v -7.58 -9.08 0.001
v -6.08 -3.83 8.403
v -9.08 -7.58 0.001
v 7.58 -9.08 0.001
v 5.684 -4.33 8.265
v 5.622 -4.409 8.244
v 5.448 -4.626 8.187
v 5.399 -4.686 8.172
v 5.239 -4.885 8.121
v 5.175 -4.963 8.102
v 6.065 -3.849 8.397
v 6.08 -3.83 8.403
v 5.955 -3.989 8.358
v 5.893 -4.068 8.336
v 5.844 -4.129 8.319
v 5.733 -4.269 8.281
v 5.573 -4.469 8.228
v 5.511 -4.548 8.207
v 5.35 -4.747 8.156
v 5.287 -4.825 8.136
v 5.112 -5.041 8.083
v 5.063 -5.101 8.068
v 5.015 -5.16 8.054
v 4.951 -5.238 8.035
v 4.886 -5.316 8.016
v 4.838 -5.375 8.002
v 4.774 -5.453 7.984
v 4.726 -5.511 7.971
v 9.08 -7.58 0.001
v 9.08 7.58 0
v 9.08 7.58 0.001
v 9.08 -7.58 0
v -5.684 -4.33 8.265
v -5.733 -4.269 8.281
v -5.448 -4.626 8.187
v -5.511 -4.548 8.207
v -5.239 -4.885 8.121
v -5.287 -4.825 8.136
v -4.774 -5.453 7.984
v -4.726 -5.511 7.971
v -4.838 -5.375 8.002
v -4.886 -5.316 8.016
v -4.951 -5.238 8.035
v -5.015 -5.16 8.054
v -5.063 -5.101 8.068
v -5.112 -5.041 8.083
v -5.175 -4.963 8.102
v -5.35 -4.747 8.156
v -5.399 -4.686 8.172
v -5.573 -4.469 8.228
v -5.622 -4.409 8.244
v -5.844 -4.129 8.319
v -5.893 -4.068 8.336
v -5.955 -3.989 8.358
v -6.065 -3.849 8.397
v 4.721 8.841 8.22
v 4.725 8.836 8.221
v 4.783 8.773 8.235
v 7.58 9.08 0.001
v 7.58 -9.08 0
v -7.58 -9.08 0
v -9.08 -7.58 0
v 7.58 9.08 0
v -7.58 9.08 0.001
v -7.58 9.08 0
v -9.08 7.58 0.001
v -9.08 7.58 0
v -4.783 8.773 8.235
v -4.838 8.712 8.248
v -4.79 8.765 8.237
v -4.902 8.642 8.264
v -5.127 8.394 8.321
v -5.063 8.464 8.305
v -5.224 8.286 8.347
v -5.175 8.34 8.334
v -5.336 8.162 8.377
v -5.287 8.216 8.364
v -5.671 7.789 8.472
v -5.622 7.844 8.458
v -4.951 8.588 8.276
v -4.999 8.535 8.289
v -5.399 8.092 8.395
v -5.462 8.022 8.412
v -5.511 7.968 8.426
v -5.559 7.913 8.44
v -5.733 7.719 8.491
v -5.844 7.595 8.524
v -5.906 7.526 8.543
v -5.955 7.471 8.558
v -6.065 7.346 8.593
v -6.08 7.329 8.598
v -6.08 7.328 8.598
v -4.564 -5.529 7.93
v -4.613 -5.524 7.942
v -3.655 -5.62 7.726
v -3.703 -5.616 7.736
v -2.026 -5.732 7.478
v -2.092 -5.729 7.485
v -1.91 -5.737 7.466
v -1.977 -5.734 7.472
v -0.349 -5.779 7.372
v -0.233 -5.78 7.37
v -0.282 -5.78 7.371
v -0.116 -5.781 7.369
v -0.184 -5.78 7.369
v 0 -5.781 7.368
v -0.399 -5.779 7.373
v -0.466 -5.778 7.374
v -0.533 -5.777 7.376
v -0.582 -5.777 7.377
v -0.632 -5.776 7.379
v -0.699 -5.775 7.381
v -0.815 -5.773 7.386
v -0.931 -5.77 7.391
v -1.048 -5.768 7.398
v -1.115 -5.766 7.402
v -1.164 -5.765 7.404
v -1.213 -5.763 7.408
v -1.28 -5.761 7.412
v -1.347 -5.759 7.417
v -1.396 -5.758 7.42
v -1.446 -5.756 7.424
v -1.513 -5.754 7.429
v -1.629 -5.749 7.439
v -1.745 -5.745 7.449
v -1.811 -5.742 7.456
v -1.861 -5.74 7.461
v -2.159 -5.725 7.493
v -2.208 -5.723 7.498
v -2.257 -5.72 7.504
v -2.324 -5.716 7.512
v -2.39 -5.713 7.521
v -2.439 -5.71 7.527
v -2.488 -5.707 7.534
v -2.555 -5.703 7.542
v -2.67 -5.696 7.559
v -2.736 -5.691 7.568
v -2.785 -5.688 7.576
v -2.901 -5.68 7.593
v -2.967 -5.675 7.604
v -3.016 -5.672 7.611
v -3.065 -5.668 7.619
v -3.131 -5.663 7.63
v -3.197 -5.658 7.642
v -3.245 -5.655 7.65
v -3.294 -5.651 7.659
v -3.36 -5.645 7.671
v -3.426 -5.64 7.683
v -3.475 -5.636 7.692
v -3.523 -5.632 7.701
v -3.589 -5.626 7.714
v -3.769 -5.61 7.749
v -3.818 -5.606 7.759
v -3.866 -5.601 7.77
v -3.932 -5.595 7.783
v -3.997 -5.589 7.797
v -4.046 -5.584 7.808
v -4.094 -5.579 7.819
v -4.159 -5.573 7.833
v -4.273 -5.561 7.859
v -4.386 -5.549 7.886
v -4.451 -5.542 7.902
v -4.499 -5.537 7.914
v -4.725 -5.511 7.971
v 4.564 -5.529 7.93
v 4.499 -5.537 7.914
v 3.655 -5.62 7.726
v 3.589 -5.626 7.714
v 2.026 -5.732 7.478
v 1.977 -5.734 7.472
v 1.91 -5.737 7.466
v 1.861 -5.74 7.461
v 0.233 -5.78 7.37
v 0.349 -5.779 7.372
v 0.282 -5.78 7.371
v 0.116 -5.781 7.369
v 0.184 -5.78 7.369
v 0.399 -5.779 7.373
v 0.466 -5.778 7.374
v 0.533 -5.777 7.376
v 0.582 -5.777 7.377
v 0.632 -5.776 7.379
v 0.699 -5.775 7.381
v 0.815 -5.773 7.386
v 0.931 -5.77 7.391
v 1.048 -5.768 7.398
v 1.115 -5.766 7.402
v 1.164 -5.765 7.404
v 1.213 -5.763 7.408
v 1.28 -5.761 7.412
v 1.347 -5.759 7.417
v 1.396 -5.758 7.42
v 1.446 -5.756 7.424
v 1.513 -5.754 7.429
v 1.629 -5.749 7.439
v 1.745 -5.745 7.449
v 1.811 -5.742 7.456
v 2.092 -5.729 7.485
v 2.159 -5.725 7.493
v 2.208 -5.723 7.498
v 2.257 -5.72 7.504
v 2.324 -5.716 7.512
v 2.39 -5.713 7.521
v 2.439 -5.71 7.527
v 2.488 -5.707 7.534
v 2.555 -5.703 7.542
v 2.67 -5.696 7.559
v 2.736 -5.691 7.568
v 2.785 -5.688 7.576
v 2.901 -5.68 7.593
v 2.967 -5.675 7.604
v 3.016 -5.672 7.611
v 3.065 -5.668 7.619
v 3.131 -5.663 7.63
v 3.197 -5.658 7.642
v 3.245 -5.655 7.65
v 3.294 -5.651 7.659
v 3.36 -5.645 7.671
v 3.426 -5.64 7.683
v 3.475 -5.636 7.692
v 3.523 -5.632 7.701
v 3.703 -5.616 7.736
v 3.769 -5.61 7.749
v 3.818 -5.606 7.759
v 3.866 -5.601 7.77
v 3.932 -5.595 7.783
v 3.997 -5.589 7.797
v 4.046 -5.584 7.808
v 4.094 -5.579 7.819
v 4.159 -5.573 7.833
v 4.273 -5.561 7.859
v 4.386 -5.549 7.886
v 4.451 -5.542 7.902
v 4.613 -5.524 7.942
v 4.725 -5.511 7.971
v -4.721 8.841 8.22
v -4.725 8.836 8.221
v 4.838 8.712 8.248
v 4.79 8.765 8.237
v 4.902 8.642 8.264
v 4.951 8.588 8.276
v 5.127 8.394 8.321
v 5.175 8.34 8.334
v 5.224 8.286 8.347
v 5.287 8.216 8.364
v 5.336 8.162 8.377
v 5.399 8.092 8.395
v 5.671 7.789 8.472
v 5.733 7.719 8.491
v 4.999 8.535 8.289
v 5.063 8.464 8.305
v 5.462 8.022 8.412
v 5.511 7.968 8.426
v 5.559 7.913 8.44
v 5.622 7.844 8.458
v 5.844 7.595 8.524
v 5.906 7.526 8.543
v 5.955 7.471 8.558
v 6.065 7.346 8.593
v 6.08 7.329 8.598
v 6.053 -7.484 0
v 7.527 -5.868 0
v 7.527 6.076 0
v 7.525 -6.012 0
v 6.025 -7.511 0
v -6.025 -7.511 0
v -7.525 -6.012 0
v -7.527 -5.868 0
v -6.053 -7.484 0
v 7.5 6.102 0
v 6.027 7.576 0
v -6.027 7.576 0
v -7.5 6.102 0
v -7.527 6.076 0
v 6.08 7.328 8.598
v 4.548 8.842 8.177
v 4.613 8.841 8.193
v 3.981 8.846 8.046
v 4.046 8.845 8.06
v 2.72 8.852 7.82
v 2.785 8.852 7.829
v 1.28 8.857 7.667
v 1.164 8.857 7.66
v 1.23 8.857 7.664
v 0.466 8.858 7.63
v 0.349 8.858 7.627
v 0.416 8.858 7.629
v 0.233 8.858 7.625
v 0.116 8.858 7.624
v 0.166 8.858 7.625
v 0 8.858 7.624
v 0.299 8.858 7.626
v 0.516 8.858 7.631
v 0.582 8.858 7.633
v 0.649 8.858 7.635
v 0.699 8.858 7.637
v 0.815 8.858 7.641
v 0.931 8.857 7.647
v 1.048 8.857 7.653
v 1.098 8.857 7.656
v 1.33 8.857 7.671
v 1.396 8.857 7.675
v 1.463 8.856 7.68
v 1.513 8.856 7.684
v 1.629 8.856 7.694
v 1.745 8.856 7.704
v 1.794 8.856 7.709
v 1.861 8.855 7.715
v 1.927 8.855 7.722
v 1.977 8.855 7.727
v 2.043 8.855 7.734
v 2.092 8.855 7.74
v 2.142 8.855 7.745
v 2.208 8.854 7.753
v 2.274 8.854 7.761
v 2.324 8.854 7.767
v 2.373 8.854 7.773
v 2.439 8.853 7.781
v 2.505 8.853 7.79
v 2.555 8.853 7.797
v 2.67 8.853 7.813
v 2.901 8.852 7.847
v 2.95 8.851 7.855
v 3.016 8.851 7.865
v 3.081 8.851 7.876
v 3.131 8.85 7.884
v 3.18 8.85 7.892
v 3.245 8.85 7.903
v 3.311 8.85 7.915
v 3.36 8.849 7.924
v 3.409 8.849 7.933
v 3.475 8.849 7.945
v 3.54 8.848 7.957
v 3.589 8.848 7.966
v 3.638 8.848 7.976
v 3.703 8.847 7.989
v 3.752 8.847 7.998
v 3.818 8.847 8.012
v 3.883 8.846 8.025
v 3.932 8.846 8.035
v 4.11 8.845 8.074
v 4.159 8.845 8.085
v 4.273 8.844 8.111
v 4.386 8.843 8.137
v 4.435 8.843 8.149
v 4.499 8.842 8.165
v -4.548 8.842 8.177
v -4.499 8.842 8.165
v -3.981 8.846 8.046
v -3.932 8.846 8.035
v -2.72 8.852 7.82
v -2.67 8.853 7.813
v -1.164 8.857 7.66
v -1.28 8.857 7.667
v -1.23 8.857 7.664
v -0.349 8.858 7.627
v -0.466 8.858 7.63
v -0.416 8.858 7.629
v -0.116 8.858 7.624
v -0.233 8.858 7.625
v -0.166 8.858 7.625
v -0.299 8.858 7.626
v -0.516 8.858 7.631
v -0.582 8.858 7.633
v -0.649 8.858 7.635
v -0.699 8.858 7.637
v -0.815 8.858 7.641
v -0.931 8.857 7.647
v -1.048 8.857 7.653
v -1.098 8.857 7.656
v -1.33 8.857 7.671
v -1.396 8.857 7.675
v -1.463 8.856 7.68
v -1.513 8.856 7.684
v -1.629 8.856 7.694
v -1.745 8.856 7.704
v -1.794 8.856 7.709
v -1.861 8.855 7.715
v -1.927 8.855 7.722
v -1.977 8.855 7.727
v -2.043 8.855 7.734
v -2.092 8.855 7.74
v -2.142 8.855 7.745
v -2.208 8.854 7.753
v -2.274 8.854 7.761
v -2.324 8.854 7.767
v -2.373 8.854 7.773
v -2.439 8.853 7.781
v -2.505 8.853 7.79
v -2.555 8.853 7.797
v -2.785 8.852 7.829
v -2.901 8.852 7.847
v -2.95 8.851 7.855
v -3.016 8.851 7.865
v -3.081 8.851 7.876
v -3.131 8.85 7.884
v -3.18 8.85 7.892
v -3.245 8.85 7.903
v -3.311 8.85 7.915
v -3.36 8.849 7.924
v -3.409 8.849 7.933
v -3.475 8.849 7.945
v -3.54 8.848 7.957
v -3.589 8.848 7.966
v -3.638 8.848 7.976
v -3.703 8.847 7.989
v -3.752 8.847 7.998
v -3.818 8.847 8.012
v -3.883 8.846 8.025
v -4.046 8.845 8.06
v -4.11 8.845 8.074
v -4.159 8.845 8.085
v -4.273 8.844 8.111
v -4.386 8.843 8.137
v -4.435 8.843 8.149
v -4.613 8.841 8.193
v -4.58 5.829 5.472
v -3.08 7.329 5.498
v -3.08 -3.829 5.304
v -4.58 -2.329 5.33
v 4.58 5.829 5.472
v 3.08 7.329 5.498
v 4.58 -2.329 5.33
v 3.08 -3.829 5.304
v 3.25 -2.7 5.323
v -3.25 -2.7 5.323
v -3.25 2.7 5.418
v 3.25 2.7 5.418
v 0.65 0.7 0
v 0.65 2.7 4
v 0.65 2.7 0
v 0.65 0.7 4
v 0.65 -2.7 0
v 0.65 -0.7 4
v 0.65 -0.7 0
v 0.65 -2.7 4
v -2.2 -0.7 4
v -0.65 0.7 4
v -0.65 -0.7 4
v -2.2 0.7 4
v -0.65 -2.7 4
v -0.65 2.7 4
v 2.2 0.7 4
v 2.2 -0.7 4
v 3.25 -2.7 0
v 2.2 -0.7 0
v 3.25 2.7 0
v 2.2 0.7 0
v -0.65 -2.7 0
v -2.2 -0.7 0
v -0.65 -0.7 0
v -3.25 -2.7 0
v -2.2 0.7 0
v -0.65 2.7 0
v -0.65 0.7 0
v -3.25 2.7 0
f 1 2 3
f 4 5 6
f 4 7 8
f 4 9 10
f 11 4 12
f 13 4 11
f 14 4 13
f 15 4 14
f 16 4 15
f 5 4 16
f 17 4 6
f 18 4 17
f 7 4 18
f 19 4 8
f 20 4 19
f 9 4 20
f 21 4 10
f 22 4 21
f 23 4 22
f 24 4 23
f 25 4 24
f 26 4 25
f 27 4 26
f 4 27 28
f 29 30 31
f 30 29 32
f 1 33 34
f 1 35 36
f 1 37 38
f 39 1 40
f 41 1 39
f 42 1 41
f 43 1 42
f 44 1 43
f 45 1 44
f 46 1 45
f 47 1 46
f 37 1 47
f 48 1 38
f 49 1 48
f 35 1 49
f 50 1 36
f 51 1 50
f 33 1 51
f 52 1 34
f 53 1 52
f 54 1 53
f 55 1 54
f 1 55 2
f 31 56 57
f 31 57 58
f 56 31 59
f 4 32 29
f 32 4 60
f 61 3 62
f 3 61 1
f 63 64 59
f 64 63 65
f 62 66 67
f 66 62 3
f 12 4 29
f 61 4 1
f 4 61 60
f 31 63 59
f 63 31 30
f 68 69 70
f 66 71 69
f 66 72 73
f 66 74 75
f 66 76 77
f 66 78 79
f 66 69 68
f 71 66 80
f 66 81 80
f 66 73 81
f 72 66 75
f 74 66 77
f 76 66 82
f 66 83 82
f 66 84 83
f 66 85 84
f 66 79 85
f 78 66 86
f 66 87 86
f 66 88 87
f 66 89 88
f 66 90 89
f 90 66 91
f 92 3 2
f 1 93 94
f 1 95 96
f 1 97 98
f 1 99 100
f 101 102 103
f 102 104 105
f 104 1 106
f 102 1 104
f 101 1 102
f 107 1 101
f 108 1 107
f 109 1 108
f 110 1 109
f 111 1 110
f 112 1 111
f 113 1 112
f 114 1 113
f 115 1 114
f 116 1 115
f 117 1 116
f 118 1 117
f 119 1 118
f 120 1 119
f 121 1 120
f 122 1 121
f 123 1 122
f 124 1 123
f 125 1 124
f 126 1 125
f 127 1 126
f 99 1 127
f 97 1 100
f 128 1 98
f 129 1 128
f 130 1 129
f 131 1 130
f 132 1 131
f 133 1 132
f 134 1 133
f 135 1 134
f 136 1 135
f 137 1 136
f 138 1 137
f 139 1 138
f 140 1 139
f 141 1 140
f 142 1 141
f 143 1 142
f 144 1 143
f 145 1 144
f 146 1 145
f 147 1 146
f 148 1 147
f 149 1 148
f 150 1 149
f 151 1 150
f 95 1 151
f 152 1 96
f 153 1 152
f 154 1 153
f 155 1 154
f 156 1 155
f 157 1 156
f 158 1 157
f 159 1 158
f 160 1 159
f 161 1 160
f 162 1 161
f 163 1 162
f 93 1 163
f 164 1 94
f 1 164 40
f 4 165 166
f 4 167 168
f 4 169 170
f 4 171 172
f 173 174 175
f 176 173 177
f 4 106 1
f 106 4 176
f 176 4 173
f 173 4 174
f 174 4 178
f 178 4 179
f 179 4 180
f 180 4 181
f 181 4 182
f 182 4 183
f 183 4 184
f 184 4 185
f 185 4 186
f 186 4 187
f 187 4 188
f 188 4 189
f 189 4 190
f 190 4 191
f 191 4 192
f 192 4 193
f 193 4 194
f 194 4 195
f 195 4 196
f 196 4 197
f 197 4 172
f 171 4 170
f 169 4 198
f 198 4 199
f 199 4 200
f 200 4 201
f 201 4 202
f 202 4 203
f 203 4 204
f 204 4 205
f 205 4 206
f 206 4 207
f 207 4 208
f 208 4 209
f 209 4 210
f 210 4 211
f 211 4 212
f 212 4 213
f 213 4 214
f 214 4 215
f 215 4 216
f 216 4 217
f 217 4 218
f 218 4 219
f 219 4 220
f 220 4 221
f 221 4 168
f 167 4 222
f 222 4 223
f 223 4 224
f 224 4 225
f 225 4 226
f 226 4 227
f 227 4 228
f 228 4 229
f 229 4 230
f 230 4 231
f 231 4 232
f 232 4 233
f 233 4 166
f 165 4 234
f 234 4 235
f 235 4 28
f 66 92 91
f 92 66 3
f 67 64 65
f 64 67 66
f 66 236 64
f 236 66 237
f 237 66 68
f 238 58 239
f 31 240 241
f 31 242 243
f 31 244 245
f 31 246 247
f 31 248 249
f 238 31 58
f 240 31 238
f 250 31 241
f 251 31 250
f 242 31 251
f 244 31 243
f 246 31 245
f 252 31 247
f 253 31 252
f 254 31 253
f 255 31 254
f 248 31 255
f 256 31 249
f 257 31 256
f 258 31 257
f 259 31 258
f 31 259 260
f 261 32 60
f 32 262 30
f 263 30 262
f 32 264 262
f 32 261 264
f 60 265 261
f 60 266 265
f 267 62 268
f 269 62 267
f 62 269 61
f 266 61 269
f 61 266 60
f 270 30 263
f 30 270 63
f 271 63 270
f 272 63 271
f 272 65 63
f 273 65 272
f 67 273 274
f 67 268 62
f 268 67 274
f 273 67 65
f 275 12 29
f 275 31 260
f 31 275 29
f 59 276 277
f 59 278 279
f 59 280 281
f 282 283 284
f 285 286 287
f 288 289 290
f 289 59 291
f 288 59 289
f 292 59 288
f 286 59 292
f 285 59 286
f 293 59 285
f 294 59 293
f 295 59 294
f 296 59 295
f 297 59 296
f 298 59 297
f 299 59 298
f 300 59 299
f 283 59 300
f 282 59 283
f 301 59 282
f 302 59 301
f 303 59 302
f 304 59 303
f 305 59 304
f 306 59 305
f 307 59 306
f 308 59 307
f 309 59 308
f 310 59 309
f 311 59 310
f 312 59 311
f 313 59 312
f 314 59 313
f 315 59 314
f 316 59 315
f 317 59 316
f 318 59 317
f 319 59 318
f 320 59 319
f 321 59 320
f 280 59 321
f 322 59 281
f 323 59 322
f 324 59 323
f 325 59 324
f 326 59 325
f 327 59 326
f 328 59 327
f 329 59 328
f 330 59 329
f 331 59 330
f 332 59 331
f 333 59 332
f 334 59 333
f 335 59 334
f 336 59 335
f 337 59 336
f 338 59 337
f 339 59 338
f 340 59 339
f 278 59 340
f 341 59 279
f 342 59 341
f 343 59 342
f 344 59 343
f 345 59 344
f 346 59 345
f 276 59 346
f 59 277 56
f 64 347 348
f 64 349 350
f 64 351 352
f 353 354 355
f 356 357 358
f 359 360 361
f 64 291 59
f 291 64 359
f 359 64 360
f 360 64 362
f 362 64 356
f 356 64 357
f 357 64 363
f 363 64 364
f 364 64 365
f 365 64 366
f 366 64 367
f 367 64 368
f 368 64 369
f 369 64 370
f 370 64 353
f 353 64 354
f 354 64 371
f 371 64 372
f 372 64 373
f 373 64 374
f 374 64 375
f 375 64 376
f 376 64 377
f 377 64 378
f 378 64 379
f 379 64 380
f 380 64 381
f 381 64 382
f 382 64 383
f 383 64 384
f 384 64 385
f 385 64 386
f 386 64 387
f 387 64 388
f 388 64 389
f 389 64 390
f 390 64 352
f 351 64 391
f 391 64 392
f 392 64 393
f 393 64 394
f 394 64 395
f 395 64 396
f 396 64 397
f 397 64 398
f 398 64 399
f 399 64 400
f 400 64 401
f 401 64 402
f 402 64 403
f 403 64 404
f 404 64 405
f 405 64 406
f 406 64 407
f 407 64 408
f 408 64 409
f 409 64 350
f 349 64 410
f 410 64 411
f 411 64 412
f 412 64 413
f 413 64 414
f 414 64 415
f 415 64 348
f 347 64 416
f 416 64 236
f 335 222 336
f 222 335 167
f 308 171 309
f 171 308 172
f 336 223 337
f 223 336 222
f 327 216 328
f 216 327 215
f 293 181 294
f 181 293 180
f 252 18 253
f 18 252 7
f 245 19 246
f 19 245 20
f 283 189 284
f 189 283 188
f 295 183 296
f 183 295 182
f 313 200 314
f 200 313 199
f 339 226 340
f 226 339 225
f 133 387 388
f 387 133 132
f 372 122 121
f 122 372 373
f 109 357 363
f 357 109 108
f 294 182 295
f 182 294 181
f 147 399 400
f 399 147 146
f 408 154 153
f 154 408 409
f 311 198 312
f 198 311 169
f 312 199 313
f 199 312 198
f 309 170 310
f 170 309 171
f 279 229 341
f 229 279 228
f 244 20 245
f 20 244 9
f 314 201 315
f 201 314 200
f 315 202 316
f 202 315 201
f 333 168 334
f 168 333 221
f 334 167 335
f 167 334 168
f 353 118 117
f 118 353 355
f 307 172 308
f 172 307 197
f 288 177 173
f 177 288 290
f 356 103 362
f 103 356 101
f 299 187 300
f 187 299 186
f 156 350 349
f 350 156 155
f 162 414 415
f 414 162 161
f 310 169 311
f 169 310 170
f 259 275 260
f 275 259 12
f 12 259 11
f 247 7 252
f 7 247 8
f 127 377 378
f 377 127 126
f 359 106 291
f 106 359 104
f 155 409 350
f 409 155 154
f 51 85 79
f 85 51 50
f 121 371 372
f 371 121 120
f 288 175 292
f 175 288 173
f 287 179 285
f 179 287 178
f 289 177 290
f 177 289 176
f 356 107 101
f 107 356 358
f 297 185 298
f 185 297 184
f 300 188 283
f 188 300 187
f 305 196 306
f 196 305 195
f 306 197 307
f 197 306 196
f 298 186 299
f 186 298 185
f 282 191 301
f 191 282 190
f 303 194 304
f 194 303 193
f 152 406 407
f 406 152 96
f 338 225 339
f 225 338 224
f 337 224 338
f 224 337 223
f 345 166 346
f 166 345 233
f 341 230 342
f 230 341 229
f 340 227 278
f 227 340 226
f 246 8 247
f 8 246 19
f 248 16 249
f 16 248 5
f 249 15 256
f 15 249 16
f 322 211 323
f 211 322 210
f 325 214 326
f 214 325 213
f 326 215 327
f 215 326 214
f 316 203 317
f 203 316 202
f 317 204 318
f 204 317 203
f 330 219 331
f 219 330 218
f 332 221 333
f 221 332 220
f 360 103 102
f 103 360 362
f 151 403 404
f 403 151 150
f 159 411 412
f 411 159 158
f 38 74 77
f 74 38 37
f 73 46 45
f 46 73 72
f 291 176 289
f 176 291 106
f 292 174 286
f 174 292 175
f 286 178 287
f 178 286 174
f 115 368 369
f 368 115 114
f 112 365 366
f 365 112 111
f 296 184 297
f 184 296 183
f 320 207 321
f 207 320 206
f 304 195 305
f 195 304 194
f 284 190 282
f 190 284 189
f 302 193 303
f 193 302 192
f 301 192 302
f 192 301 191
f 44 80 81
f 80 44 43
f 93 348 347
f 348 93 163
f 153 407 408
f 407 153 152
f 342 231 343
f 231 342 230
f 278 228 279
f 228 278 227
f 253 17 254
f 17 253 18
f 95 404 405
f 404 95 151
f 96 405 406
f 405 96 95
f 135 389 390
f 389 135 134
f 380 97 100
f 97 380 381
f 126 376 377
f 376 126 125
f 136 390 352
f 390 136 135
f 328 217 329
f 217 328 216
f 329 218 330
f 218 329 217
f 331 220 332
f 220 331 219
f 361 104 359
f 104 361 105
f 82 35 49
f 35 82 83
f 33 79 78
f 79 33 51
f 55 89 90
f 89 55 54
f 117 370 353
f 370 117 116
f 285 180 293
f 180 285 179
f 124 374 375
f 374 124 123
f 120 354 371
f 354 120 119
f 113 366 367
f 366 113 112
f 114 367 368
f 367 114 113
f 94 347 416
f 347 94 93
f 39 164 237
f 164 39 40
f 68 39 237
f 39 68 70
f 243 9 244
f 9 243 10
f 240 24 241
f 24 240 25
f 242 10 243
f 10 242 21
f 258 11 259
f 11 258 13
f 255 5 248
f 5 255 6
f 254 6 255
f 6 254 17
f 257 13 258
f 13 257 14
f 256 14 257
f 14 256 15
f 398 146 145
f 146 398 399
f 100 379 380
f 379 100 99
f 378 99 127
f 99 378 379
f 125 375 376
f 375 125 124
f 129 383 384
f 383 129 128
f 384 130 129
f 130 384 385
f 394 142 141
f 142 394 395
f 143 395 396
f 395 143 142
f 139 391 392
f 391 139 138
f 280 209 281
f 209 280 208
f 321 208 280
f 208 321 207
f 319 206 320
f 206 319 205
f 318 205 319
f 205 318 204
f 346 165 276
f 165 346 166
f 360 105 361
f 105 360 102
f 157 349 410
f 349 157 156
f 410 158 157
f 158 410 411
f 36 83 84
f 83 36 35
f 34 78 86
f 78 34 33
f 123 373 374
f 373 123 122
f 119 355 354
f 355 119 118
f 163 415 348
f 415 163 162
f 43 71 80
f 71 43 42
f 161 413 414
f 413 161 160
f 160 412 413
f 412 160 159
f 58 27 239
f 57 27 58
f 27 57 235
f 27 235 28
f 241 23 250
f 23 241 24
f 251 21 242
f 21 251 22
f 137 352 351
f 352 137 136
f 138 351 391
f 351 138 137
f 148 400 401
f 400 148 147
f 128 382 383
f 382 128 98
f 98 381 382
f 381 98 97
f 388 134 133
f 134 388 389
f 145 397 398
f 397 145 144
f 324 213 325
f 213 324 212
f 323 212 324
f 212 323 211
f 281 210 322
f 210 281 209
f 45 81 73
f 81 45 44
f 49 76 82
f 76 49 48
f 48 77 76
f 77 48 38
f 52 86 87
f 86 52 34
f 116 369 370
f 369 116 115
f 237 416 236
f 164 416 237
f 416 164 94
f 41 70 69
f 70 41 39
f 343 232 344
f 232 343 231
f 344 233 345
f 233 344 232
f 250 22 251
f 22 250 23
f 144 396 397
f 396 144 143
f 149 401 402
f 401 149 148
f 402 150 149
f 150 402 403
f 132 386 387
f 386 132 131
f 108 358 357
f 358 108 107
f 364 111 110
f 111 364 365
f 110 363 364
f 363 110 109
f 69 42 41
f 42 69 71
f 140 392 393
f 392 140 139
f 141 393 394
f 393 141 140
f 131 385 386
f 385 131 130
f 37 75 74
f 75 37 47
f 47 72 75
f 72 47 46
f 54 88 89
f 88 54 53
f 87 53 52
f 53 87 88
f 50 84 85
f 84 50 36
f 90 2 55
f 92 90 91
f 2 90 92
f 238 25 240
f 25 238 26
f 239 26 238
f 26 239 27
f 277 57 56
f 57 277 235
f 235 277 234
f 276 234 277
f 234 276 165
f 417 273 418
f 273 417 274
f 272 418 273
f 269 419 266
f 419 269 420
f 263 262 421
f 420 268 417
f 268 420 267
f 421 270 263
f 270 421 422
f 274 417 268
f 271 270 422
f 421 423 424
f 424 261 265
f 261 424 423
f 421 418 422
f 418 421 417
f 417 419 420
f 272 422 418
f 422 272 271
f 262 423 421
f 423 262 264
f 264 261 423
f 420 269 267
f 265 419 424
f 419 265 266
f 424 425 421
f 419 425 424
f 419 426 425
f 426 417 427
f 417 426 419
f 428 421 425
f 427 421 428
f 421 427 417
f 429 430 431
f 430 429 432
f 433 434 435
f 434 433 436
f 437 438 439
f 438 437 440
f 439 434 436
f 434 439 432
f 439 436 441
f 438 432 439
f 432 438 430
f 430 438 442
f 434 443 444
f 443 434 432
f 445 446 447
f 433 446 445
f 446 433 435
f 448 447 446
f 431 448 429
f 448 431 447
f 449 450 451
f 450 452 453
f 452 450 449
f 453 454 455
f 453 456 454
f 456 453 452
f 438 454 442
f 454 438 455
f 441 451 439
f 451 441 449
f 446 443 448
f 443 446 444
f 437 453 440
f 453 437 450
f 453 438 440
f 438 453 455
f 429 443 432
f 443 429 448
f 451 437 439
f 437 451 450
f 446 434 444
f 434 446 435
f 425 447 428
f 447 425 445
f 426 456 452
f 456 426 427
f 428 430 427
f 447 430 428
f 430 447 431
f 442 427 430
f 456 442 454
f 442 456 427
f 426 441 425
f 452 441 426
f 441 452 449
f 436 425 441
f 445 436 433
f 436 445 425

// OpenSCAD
// Row 5? Cherry MX key
//change to round things better
$fn = 4;

//scale of inner to outer shape
key_wall_thickness_width =  .8;
key_wall_thickness_height = .8;
key_wall_thickness_depth =  .8;
//length in units of key
key_length = 1;


//connector brim
//enable brim for connector
has_brim = 0;
//brim radius. 11 ensconces normal keycap stem in normal keycap
brim_radius = 11;
//brim depth
brim_depth = .3;



//whether stabilizer connectors are enabled
stabilizers = 0;

//stabilizer distance
stabilizer_distance = 50;

// invert dishing. mostly for spacebar
inverted_dish = 0;

//keycap type, [0..11]
  /*
   * 0 = DCS Function row
   * 1 = DCS row 1 (number row)
   * 2 = DCS row 2 (tab, q, w...)
   * 3 = DCS row 3 (caps lock, a, s...)
   * 4 = DCS row 4 (shift, z, x...) and row 5 (ctrl, alt...)
   */
key_profile = 1;
echo("Key Length: ",key_length);
echo("Key profile: ",key_profile);

//profile specific stuff

/*god, I would love a class right here
 here we have, for lack of a better implementation, an array
 that defines the more intimate aspects of a key.
 order is thus:
 1. Bottom Key Width: width of the immediate bottom of the key
 2. Bottom Key Height: height of the immediate bottom of the key
 3. Top Key Width Difference: mm to subtract from bottom key width to create top key width
 4. Top Key Height Difference: mm to subtract from bottom key height to create top key height
 5. total Depth: how tall the total in the switch is before dishing
 6. Top Tilt: X rotation of the top. Top and dish obj are rotated
 7. Top Skew: Y skew of the top of the key relative to the bottom. DCS has some, DSA has none (its centered)
 8. Dish Type: type of dishing. currently sphere and cylinder
 9. Dish Depth: how many mm to cut into the key with
 10. Dish Radius: radius of dish obj, the Sphere or Cylinder that cuts into the keycap
*/

key_profiles = [

	//DCS Profile

	[ //DCS ROW 5
		18.16,  // Bottom Key Width
		18.16,  // Bottom Key Height
		6,   // Top Key Width Difference
		4,   // Top Key Height Difference
		11.5, // total Depth
		-6,  // Top Tilt
		1.75,// Top Skew

		//Dish Profile

		0,   // Dish Type
		1,   // Dish Depth
		0,   // Dish Skew X
		0    // DIsh Skew Y
	],
	[ //DCS ROW 1
		18.16,  // Bottom Key Width
		18.16,  // Bottom Key Height
		6,   // Top Key Width Difference
		4,   // Top Key Height Difference
		8.5, // total Depth
		-1,  // Top Tilt
		1.75,// Top Skew

		//Dish Profile

		0,   // Dish Type
		1,   // Dish Depth
		0,   // Dish Skew X
		0    // DIsh Skew Y
	],
	[ //DCS ROW 2
		18.16,  // Bottom Key Width
		18.16,  // Bottom Key Height
		6.2,   // Top Key Width Difference
		4,   // Top Key Height Difference
		7.5, // total Depth
		3,  // Top Tilt
		1.75,// Top Skew

		//Dish Profile

		0,   // Dish Type
		1,   // Dish Depth
		0,   // Dish Skew X
		0    // DIsh Skew Y
	],
	[ //DCS ROW 3
		18.16,  // Bottom Key Width
		18.16,  // Bottom Key Height
		6,   // Top Key Width Difference
		4,   // Top Key Height Difference
		6.2, // total Depth
		7,  // Top Tilt
		1.75,// Top Skew

		//Dish Profile

		0,   // Dish Type
		1,   // Dish Depth
		0,   // Dish Skew X
		0    // DIsh Skew Y
	],
	[ //DCS ROW 4
		18.16,  // Bottom Key Width
		18.16,  // Bottom Key Height
		6,   // Top Key Width Difference
		4,   // Top Key Height Difference
		6.2, // total Depth
		16,  // Top Tilt
		1.75,// Top Skew

		//Dish Profile

		0,   // Dish Type
		1,   // Dish Depth
		0,   // Dish Skew X
		0    // DIsh Skew Y
	],

	//DSA Profile

	[ //DSA ROW 3
	  18.4,  // Bottom Key Width
	  18.4,  // Bottom Key Height
	  5.7, // Top Key Width Difference
	  5.7, // Top Key Height Difference
	  7.4, // total Depth
	  0,   // Top Tilt
	  0,   // Top Skew

	  //Dish Profile

	  1,   // Dish Type
	  1.2, // Dish Depth
	  0,   // Dish Skew X
	  0    // DIsh Skew Y
	],

	//SA Proile

	[ //SA ROW 1
		18.4,  // Bottom Key Width
	  18.4,  // Bottom Key Height
	  5.7, // Top Key Width Difference
	  5.7, // Top Key Height Difference
	  13.73, // total Depth, fudged
	  -14,   // Top Tilt
	  0,   // Top Skew

	  //Dish Profile

	  1,   // Dish Type
	  1.2, // Dish Depth
	  0,   // Dish Skew X
	  0    // DIsh Skew Y
	],
	[ //SA ROW 2
		18.4,  // Bottom Key Width
	  18.4,  // Bottom Key Height
	  5.7, // Top Key Width Difference
	  5.7, // Top Key Height Difference
	  11.73, // total Depth
	  -7,   // Top Tilt
	  0,   // Top Skew

	  //Dish Profile

	  1,   // Dish Type
	  1.2, // Dish Depth
	  0,   // Dish Skew X
	  0    // DIsh Skew Y
	],
	[ //SA ROW 3
		18.4,  // Bottom Key Width
	  18.4,  // Bottom Key Height
	  5.7, // Top Key Width Difference
	  5.7, // Top Key Height Difference
	  11.73, // total Depth
	  0,   // Top Tilt
	  0,   // Top Skew

	  //Dish Profile

	  1,   // Dish Type
	  1.2, // Dish Depth
	  0,   // Dish Skew X
	  0    // DIsh Skew Y
	],
	[ //SA ROW 4
		18.4,  // Bottom Key Width
	  18.4,  // Bottom Key Height
	  5.7, // Top Key Width Difference
	  5.7, // Top Key Height Difference
	  11.73, // total Depth
	  7,   // Top Tilt
	  0,   // Top Skew

	  //Dish Profile

	  1,   // Dish Type
	  1.2, // Dish Depth
	  0,   // Dish Skew X
	  0    // DIsh Skew Y
	],
	[ //DCS ROW 2 SPACEBAR
		18.16,  // Bottom Key Width
		18.16,  // Bottom Key Height
		6.2,   // Top Key Width Difference
		4,   // Top Key Height Difference
		7.5, // total Depth
		3,  // Top Tilt
		1.75,// Top Skew

		//Dish Profile

		2,   // Dish Type
		1,   // Dish Depth
		0,   // Dish Skew X
		0    // DIsh Skew Y
	],
	[ //DCS ROW 4 SPACEBAR (ORIGINAL)
		18.16,  // Bottom Key Width
		18.16,  // Bottom Key Height
		6,   // Top Key Width Difference
		4,   // Top Key Height Difference
		6.2, // total Depth
		16,  // Top Tilt
		1.75,// Top Skew

		//Dish Profile

		2,   // Dish Type
		1,   // Dish Depth
		0,   // Dish Skew X
		0    // DIsh Skew Y
	],
];

// cherry MX or Alps stem [0..1]
stem_profile=0;

// how inset the stem is from the bottom of the key. experimental
stem_inset=0;

//libraries. they generate geometry
//that is used by other things to generate features

//centered
module roundedRect(size, radius) {
	x = size[0];
	y = size[1];
	z = size[2];

	translate([-x/2,-y/2,0])
	linear_extrude(height=z)
	hull() {
		translate([radius, radius, 0])
		circle(r=radius);

		translate([x - radius, radius, 0])
		circle(r=radius);

		translate([x - radius, y - radius, 0])
		circle(r=radius);

		translate([radius, y - radius, 0])
		circle(r=radius);
	}
}


//bottom we can use to anchor things
module inside(key_profile)
{
	difference(){
		translate([0,0,50])
		cube([100,100,100],center=true);

		translate([0,0,-.1])
		shape(key_profile, 3);
	}
}

module cherry_stem(){
	// cross length
	cross_length = 4.4;
	//dimensions of connector
	// outer cross extra length in x
	extra_outer_cross_width = 2.10;
	// outer cross extra length in y
	extra_outer_cross_height = 1.0;
	// dimensions of cross
	// horizontal cross bar width
	horizontal_cross_width = 1.4;
	// vertical cross bar width
	vertical_cross_width = 1.3;
	//extra vertical cross length - the extra length of the up/down bar of the cross
	extra_vertical_cross_length = 1.1;
	// cross depth, stem height is 3.4mm
	cross_depth = 4;

	difference(){
		union(){
			translate(
				[
		 			-(cross_length+extra_outer_cross_width)/2,
		 			-(cross_length+extra_outer_cross_height)/2,
		 			stem_inset
				]
			)
			cube( // the base of the stem, the part the cruciform digs into
				[
					cross_length+extra_outer_cross_width,
					cross_length+extra_outer_cross_height,
					50
				]
			);
			if (has_brim == 1){ cylinder(r=brim_radius,h=brim_depth); }
		}
		//the cross part of the steam
		translate([0,0,(cross_depth)/2 + stem_inset]){
	        cube([vertical_cross_width,cross_length+extra_vertical_cross_length,cross_depth], center=true );//remove +2 to print with cross
	        cube([cross_length,horizontal_cross_width,cross_depth], center=true );
	    }
	}
}

module alps_stem(){
	cross_depth = 40;
	width = 4.45;
	height = 2.25;

	base_width = 12;
	base_height = 15;

	//translate([0,0,cross_depth + 50/2]) cube([base_width, base_height, 50], center=true);
	translate([0,0,cross_depth/2 + stem_inset]){
		cube([width,height,cross_depth], center = true);
	}


}

//whole connector
module connector(key_profile,has_brim){
	difference(){
		//TODO can I really not do an array index here?
		if(stem_profile==0) cherry_stem();
		if(stem_profile==1) alps_stem();
		inside(key_profile);
	}
}

//stabilizer connectors 
module stabilizer_connectors(key_profile,has_brim){
	translate([stabilizer_distance,0,0]) connector(key_profile, has_brim);
	translate([-stabilizer_distance,0,0]) connector(key_profile, has_brim);
}

//i h8 u scad
module shape(key_profile, thickness){

	bottom_key_width = key_profile[0] ;
	bottom_key_height = key_profile[1];
	top_key_width_difference = key_profile[2];
	top_key_height_difference = key_profile[3];
	total_depth = key_profile[4] - thickness;
	top_tilt = key_profile[5];
	top_skew = key_profile[6];

    if (inverted_dish == 1){
		difference(){
			union(){
				shape_hull(key_profile, thickness, 1);
				dish(key_profile, thickness);
			}
			outside(key_profile, thickness);
		}
	}
	else{
		difference(){
			shape_hull(key_profile, thickness, 1);	
			dish(key_profile, thickness);
		}
	}
}

//conicalish clipping shape to trim things off the outside of the keycap
module outside(key_profile, thickness){
	difference(){
		cube([100000,100000,100000],center = true);
		shape_hull(key_profile, thickness, 2);
	}
}

//super basic hull shape without dish
module shape_hull(key_profile, thickness, modifier){
	bottom_key_width = key_profile[0] ;
	bottom_key_height = key_profile[1];
	top_key_width_difference = key_profile[2];
	top_key_height_difference = key_profile[3];
	total_depth = key_profile[4] - thickness;
	top_tilt = key_profile[5];
	top_skew = key_profile[6];

	hull(){
		roundedRect([bottom_key_width*key_length - thickness,bottom_key_height - thickness,.001],1.5);

		translate([0,top_skew,total_depth * modifier])
		rotate([-top_tilt,0,0])
		roundedRect([bottom_key_width*key_length - thickness -top_key_width_difference * modifier,bottom_key_height - thickness -top_key_height_difference * modifier,.001],1.5);
	}
}
//end libraries

//dish selector
module dish(key_profile){ //this thing is a monster
	// names, so I don't go crazy
	total_key_width = key_profile[0];
	total_key_height = key_profile[1];
	width_difference = key_profile[2];
	height_difference = key_profile[3];
	total_depth = key_profile[4];
	top_tilt = key_profile[5];
	top_skew = key_profile[6];
	dish_type = key_profile[7];
	dish_depth = key_profile[8];
	dish_skew_x = key_profile[9];
	dish_skew_y = key_profile[10];

	//dependant variables
	key_width = total_key_width * key_length - width_difference;
	key_height = total_key_height - height_difference;

	if(dish_type == 0){ // cylindrical dish
		/* we do some funky math here
		 * basically you want to have the dish "dig in" to the keycap x millimeters
		 * in order to do that you have to solve a small (2d) system of equations
		 * where the chord of the spherical cross section of the dish is
		 * the width of the keycap.
		 */
		// the distance you have to move the dish up so it digs in dish_depth millimeters
		chord_length = (pow(key_width, 2) - 4 * pow(dish_depth, 2)) / (8 * dish_depth);
		//the radius of the dish
		rad = (pow(key_width, 2) + 4 * pow(dish_depth, 2)) / (8 * dish_depth);

		if (inverted_dish == 1){
			translate([dish_skew_x, top_skew + dish_skew_y, total_depth])
			rotate([90-top_tilt,0,0])
			translate([0,-chord_length,0])
			cylinder(h=100,r=rad, $fn=1024, center=true);
		}
		else{
			translate([dish_skew_x, top_skew + dish_skew_y, total_depth])
			rotate([90-top_tilt,0,0])
			translate([0,chord_length,0])
			cylinder(h=100,r=rad, $fn=1024, center=true);
		}
	}
	else if (dish_type == 1) { // spherical dish
		//same thing here, but we need the corners to just touch - so we have to find the hypotenuse of the top
		chord = pow((pow(key_width,2) + pow(key_height, 2)),0.5); //getting diagonal of the top

		// the distance you have to move the dish up so it digs in dish_depth millimeters
		chord_length = (pow(chord, 2) - 4 * pow(dish_depth, 2)) / (8 * dish_depth);
		//the radius of the dish
		rad = (pow(chord, 2) + 4 * pow(dish_depth, 2)) / (8 * dish_depth);

		if (inverted_dish == 1){
			translate([dish_skew_x, top_skew + dish_skew_y, total_depth])
            rotate([-top_tilt,0,0])
			translate([0,0,-chord_length])
			sphere(r=rad, $fn=256);
		}
		else{
			translate([dish_skew_x, top_skew + dish_skew_y, total_depth])
            rotate([-top_tilt,0,0])
			translate([0,0,chord_length])
			sphere(r=rad, $fn=256);
		}
	}
	else if (dish_type == 2){// SIDEWAYS cylindrical dish - used for spacebar

		chord_length = (pow(key_height, 2) - 4 * pow(dish_depth, 2)) / (8 * dish_depth);
		rad = (pow(key_height, 2) + 4 * pow(dish_depth, 2)) / (8 * dish_depth);

		if (inverted_dish == 1){
			translate([dish_skew_x, top_skew + dish_skew_y, total_depth])
			rotate([90,top_tilt,90])
			translate([0,-chord_length,0])
			cylinder(h=key_width + 20,r=rad, $fn=1024, center=true); // +20 just cuz
		}
		else{
			translate([dish_skew_x, top_skew + dish_skew_y, total_depth])
			rotate([90,top_tilt,90])
			translate([0,chord_length,0])
			cylinder(h=key_width + 20,r=rad, $fn=1024, center=true);
		}
	}
}

//actual full key with space carved out and keystem/stabilizer connectors
module key(key_profile){
	union(){
		difference(){
			shape(key_profile, 0);

			translate([0,0,-.1])
			shape(key_profile, 3);
		}
		connector(key_profile,has_brim);
		if (stabilizers == 1){
			stabilizer_connectors(key_profile,has_brim);
		}
	}
}


key(key_profiles[key_profile]);
